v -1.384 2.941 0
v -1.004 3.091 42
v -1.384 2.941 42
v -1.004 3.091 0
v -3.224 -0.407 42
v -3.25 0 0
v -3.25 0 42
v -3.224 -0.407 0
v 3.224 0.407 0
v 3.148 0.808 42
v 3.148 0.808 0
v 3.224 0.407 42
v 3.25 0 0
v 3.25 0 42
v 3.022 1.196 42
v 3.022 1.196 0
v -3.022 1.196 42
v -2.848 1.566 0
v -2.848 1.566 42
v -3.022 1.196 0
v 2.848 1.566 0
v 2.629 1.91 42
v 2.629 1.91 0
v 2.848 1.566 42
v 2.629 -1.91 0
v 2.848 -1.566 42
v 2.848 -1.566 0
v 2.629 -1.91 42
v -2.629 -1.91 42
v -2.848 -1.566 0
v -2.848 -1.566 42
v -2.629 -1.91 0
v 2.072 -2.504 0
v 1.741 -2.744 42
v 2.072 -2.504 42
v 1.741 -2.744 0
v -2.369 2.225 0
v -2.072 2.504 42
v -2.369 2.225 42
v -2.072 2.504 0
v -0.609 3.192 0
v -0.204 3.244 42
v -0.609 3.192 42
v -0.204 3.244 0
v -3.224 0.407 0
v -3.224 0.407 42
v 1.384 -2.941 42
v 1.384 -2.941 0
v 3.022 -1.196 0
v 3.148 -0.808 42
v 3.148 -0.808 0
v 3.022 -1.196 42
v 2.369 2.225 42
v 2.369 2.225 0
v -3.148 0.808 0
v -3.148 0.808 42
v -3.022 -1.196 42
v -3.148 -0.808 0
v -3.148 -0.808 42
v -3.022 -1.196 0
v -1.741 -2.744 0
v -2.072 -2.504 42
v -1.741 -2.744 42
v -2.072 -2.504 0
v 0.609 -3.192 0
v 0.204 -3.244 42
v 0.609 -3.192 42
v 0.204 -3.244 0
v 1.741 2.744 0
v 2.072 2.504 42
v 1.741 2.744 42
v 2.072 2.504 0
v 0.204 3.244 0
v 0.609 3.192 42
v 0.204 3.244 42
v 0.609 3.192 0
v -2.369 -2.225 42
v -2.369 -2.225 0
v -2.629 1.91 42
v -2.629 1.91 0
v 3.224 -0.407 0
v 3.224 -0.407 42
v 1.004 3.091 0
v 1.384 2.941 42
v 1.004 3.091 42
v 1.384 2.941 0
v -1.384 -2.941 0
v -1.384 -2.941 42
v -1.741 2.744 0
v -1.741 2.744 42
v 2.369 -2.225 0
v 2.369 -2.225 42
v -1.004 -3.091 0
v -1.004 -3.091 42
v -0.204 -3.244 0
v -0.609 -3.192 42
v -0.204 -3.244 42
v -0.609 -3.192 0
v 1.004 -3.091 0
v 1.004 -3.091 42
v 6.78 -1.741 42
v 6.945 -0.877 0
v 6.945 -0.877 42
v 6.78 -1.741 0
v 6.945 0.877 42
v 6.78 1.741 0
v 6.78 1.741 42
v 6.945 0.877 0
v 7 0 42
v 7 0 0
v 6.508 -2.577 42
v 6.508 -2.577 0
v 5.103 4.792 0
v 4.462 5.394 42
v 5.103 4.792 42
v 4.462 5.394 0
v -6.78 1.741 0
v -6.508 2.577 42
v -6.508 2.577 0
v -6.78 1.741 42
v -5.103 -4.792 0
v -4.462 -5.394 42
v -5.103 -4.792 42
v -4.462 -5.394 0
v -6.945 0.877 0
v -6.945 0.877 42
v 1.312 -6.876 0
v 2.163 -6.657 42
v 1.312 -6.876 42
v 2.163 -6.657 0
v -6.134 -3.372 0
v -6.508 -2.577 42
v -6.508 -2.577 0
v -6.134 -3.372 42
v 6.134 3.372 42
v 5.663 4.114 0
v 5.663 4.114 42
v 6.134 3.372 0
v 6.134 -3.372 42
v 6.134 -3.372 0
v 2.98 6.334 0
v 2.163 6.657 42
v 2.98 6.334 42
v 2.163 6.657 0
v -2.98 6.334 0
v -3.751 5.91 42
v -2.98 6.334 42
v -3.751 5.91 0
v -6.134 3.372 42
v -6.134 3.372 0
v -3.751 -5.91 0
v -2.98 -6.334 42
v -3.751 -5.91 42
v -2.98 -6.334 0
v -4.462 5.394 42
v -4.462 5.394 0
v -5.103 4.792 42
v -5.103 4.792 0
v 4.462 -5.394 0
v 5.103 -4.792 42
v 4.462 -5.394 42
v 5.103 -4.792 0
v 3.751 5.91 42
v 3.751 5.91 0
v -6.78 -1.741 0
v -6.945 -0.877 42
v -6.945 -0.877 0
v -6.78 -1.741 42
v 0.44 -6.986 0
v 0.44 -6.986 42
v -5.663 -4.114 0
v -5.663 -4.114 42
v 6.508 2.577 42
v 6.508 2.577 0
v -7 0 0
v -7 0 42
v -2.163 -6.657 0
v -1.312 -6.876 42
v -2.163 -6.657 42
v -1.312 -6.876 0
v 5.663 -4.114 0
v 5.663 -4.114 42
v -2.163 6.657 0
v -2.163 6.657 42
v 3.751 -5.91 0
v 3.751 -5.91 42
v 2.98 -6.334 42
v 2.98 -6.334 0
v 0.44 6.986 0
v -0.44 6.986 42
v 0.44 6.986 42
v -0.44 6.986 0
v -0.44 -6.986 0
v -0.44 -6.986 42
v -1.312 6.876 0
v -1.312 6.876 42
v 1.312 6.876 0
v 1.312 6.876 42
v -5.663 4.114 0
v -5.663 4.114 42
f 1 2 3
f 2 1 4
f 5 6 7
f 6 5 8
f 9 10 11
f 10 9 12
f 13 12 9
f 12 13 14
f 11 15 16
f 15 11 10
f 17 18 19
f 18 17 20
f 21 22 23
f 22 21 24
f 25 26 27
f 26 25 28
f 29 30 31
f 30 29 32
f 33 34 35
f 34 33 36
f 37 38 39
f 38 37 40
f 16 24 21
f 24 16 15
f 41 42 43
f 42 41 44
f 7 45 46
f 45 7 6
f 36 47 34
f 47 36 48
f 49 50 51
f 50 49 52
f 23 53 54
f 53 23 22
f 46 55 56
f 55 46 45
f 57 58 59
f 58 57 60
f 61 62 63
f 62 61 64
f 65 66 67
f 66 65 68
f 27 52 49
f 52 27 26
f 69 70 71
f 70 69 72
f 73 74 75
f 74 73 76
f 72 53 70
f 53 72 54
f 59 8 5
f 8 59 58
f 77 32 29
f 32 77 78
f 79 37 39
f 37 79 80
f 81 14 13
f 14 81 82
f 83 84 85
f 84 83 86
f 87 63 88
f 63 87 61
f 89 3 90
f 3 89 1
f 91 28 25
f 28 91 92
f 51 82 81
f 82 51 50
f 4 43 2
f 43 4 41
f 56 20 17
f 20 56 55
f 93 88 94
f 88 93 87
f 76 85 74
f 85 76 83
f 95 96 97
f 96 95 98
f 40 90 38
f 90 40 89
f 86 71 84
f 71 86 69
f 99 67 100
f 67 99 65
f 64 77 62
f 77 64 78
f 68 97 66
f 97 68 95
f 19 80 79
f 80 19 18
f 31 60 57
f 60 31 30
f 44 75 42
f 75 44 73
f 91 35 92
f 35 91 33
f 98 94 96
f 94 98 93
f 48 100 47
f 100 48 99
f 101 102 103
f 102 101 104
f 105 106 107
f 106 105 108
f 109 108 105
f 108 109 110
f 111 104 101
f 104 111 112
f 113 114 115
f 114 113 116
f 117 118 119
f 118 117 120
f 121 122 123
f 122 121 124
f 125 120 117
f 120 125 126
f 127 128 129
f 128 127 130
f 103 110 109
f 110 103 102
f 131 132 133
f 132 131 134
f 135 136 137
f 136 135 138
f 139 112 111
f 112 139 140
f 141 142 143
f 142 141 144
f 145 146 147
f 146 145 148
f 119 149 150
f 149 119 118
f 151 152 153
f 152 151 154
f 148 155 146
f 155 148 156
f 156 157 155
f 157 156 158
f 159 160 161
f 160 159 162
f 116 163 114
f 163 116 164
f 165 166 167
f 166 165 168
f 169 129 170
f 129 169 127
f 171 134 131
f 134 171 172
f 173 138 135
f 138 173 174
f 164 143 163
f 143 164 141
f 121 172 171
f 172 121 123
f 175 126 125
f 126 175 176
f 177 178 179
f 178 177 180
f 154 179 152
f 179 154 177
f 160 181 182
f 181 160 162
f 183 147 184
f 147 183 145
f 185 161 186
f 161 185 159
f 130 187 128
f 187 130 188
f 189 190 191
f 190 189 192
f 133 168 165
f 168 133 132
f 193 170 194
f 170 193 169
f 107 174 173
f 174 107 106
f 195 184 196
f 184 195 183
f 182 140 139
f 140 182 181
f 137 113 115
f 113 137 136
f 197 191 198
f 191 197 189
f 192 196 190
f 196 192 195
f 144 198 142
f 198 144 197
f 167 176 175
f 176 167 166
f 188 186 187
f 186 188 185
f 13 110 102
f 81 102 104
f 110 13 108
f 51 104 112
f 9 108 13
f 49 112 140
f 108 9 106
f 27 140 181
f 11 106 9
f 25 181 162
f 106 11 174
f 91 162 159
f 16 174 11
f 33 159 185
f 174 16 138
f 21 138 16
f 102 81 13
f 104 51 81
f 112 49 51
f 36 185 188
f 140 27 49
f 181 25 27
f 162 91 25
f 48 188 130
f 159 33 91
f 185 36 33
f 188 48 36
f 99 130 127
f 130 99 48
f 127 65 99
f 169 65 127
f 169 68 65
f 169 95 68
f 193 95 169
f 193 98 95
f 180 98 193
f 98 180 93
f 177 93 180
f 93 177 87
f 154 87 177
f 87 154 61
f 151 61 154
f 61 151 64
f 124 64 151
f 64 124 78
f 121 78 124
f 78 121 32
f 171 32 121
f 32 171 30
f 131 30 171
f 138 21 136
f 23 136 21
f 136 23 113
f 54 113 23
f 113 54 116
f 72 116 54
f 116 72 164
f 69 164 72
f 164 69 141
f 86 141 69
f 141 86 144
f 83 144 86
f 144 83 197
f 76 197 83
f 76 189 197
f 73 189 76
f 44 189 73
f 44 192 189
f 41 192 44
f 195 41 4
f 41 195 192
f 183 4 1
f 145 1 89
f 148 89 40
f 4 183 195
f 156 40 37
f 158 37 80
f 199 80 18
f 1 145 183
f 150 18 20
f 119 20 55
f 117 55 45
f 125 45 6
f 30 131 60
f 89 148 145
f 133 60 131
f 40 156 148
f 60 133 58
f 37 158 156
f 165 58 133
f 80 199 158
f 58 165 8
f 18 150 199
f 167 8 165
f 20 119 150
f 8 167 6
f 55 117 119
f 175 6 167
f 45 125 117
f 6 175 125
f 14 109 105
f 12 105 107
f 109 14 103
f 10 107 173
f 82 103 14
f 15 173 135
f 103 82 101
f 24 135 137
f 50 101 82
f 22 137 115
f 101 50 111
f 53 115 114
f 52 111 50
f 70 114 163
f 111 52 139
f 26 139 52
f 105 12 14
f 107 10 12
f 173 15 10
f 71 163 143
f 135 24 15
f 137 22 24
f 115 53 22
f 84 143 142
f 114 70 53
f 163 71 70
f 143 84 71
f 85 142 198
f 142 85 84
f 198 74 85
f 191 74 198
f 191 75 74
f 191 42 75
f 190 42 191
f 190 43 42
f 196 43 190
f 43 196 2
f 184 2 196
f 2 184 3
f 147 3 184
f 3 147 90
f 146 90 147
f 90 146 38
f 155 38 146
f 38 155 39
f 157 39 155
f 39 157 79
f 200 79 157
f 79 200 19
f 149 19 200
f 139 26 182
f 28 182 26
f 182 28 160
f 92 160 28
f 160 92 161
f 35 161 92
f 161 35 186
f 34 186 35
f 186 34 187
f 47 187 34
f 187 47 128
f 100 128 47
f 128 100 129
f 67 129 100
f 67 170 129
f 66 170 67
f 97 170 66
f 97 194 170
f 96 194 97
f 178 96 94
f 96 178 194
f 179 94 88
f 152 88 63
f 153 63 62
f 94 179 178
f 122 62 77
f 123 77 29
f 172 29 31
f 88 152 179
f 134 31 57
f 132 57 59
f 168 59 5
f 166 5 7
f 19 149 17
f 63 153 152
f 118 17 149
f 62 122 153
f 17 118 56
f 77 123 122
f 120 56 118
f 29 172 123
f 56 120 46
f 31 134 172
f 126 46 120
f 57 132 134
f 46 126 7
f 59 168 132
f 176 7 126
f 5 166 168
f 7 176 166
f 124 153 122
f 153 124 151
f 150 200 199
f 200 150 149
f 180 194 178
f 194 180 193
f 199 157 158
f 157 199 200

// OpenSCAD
$fn = 50;


difference() {
	union() {
		cylinder(h = 42, r = 7.0000000000);
	}
	union() {
		translate(v = [0.0000000000, 0.0000000000, -100.0000000000]) {
			cylinder(h = 200, r = 3.2500000000);
		}
		translate(v = [0.0000000000, 0.0000000000, -100.0000000000]) {
			cylinder(h = 200, r = 3.2500000000);
		}
		translate(v = [0.0000000000, 0.0000000000, -100.0000000000]) {
			cylinder(h = 200, r = 3.2500000000);
		}
		translate(v = [0.0000000000, 0.0000000000, -100.0000000000]) {
			cylinder(h = 200, r = 3.2500000000);
		}
	}
}
